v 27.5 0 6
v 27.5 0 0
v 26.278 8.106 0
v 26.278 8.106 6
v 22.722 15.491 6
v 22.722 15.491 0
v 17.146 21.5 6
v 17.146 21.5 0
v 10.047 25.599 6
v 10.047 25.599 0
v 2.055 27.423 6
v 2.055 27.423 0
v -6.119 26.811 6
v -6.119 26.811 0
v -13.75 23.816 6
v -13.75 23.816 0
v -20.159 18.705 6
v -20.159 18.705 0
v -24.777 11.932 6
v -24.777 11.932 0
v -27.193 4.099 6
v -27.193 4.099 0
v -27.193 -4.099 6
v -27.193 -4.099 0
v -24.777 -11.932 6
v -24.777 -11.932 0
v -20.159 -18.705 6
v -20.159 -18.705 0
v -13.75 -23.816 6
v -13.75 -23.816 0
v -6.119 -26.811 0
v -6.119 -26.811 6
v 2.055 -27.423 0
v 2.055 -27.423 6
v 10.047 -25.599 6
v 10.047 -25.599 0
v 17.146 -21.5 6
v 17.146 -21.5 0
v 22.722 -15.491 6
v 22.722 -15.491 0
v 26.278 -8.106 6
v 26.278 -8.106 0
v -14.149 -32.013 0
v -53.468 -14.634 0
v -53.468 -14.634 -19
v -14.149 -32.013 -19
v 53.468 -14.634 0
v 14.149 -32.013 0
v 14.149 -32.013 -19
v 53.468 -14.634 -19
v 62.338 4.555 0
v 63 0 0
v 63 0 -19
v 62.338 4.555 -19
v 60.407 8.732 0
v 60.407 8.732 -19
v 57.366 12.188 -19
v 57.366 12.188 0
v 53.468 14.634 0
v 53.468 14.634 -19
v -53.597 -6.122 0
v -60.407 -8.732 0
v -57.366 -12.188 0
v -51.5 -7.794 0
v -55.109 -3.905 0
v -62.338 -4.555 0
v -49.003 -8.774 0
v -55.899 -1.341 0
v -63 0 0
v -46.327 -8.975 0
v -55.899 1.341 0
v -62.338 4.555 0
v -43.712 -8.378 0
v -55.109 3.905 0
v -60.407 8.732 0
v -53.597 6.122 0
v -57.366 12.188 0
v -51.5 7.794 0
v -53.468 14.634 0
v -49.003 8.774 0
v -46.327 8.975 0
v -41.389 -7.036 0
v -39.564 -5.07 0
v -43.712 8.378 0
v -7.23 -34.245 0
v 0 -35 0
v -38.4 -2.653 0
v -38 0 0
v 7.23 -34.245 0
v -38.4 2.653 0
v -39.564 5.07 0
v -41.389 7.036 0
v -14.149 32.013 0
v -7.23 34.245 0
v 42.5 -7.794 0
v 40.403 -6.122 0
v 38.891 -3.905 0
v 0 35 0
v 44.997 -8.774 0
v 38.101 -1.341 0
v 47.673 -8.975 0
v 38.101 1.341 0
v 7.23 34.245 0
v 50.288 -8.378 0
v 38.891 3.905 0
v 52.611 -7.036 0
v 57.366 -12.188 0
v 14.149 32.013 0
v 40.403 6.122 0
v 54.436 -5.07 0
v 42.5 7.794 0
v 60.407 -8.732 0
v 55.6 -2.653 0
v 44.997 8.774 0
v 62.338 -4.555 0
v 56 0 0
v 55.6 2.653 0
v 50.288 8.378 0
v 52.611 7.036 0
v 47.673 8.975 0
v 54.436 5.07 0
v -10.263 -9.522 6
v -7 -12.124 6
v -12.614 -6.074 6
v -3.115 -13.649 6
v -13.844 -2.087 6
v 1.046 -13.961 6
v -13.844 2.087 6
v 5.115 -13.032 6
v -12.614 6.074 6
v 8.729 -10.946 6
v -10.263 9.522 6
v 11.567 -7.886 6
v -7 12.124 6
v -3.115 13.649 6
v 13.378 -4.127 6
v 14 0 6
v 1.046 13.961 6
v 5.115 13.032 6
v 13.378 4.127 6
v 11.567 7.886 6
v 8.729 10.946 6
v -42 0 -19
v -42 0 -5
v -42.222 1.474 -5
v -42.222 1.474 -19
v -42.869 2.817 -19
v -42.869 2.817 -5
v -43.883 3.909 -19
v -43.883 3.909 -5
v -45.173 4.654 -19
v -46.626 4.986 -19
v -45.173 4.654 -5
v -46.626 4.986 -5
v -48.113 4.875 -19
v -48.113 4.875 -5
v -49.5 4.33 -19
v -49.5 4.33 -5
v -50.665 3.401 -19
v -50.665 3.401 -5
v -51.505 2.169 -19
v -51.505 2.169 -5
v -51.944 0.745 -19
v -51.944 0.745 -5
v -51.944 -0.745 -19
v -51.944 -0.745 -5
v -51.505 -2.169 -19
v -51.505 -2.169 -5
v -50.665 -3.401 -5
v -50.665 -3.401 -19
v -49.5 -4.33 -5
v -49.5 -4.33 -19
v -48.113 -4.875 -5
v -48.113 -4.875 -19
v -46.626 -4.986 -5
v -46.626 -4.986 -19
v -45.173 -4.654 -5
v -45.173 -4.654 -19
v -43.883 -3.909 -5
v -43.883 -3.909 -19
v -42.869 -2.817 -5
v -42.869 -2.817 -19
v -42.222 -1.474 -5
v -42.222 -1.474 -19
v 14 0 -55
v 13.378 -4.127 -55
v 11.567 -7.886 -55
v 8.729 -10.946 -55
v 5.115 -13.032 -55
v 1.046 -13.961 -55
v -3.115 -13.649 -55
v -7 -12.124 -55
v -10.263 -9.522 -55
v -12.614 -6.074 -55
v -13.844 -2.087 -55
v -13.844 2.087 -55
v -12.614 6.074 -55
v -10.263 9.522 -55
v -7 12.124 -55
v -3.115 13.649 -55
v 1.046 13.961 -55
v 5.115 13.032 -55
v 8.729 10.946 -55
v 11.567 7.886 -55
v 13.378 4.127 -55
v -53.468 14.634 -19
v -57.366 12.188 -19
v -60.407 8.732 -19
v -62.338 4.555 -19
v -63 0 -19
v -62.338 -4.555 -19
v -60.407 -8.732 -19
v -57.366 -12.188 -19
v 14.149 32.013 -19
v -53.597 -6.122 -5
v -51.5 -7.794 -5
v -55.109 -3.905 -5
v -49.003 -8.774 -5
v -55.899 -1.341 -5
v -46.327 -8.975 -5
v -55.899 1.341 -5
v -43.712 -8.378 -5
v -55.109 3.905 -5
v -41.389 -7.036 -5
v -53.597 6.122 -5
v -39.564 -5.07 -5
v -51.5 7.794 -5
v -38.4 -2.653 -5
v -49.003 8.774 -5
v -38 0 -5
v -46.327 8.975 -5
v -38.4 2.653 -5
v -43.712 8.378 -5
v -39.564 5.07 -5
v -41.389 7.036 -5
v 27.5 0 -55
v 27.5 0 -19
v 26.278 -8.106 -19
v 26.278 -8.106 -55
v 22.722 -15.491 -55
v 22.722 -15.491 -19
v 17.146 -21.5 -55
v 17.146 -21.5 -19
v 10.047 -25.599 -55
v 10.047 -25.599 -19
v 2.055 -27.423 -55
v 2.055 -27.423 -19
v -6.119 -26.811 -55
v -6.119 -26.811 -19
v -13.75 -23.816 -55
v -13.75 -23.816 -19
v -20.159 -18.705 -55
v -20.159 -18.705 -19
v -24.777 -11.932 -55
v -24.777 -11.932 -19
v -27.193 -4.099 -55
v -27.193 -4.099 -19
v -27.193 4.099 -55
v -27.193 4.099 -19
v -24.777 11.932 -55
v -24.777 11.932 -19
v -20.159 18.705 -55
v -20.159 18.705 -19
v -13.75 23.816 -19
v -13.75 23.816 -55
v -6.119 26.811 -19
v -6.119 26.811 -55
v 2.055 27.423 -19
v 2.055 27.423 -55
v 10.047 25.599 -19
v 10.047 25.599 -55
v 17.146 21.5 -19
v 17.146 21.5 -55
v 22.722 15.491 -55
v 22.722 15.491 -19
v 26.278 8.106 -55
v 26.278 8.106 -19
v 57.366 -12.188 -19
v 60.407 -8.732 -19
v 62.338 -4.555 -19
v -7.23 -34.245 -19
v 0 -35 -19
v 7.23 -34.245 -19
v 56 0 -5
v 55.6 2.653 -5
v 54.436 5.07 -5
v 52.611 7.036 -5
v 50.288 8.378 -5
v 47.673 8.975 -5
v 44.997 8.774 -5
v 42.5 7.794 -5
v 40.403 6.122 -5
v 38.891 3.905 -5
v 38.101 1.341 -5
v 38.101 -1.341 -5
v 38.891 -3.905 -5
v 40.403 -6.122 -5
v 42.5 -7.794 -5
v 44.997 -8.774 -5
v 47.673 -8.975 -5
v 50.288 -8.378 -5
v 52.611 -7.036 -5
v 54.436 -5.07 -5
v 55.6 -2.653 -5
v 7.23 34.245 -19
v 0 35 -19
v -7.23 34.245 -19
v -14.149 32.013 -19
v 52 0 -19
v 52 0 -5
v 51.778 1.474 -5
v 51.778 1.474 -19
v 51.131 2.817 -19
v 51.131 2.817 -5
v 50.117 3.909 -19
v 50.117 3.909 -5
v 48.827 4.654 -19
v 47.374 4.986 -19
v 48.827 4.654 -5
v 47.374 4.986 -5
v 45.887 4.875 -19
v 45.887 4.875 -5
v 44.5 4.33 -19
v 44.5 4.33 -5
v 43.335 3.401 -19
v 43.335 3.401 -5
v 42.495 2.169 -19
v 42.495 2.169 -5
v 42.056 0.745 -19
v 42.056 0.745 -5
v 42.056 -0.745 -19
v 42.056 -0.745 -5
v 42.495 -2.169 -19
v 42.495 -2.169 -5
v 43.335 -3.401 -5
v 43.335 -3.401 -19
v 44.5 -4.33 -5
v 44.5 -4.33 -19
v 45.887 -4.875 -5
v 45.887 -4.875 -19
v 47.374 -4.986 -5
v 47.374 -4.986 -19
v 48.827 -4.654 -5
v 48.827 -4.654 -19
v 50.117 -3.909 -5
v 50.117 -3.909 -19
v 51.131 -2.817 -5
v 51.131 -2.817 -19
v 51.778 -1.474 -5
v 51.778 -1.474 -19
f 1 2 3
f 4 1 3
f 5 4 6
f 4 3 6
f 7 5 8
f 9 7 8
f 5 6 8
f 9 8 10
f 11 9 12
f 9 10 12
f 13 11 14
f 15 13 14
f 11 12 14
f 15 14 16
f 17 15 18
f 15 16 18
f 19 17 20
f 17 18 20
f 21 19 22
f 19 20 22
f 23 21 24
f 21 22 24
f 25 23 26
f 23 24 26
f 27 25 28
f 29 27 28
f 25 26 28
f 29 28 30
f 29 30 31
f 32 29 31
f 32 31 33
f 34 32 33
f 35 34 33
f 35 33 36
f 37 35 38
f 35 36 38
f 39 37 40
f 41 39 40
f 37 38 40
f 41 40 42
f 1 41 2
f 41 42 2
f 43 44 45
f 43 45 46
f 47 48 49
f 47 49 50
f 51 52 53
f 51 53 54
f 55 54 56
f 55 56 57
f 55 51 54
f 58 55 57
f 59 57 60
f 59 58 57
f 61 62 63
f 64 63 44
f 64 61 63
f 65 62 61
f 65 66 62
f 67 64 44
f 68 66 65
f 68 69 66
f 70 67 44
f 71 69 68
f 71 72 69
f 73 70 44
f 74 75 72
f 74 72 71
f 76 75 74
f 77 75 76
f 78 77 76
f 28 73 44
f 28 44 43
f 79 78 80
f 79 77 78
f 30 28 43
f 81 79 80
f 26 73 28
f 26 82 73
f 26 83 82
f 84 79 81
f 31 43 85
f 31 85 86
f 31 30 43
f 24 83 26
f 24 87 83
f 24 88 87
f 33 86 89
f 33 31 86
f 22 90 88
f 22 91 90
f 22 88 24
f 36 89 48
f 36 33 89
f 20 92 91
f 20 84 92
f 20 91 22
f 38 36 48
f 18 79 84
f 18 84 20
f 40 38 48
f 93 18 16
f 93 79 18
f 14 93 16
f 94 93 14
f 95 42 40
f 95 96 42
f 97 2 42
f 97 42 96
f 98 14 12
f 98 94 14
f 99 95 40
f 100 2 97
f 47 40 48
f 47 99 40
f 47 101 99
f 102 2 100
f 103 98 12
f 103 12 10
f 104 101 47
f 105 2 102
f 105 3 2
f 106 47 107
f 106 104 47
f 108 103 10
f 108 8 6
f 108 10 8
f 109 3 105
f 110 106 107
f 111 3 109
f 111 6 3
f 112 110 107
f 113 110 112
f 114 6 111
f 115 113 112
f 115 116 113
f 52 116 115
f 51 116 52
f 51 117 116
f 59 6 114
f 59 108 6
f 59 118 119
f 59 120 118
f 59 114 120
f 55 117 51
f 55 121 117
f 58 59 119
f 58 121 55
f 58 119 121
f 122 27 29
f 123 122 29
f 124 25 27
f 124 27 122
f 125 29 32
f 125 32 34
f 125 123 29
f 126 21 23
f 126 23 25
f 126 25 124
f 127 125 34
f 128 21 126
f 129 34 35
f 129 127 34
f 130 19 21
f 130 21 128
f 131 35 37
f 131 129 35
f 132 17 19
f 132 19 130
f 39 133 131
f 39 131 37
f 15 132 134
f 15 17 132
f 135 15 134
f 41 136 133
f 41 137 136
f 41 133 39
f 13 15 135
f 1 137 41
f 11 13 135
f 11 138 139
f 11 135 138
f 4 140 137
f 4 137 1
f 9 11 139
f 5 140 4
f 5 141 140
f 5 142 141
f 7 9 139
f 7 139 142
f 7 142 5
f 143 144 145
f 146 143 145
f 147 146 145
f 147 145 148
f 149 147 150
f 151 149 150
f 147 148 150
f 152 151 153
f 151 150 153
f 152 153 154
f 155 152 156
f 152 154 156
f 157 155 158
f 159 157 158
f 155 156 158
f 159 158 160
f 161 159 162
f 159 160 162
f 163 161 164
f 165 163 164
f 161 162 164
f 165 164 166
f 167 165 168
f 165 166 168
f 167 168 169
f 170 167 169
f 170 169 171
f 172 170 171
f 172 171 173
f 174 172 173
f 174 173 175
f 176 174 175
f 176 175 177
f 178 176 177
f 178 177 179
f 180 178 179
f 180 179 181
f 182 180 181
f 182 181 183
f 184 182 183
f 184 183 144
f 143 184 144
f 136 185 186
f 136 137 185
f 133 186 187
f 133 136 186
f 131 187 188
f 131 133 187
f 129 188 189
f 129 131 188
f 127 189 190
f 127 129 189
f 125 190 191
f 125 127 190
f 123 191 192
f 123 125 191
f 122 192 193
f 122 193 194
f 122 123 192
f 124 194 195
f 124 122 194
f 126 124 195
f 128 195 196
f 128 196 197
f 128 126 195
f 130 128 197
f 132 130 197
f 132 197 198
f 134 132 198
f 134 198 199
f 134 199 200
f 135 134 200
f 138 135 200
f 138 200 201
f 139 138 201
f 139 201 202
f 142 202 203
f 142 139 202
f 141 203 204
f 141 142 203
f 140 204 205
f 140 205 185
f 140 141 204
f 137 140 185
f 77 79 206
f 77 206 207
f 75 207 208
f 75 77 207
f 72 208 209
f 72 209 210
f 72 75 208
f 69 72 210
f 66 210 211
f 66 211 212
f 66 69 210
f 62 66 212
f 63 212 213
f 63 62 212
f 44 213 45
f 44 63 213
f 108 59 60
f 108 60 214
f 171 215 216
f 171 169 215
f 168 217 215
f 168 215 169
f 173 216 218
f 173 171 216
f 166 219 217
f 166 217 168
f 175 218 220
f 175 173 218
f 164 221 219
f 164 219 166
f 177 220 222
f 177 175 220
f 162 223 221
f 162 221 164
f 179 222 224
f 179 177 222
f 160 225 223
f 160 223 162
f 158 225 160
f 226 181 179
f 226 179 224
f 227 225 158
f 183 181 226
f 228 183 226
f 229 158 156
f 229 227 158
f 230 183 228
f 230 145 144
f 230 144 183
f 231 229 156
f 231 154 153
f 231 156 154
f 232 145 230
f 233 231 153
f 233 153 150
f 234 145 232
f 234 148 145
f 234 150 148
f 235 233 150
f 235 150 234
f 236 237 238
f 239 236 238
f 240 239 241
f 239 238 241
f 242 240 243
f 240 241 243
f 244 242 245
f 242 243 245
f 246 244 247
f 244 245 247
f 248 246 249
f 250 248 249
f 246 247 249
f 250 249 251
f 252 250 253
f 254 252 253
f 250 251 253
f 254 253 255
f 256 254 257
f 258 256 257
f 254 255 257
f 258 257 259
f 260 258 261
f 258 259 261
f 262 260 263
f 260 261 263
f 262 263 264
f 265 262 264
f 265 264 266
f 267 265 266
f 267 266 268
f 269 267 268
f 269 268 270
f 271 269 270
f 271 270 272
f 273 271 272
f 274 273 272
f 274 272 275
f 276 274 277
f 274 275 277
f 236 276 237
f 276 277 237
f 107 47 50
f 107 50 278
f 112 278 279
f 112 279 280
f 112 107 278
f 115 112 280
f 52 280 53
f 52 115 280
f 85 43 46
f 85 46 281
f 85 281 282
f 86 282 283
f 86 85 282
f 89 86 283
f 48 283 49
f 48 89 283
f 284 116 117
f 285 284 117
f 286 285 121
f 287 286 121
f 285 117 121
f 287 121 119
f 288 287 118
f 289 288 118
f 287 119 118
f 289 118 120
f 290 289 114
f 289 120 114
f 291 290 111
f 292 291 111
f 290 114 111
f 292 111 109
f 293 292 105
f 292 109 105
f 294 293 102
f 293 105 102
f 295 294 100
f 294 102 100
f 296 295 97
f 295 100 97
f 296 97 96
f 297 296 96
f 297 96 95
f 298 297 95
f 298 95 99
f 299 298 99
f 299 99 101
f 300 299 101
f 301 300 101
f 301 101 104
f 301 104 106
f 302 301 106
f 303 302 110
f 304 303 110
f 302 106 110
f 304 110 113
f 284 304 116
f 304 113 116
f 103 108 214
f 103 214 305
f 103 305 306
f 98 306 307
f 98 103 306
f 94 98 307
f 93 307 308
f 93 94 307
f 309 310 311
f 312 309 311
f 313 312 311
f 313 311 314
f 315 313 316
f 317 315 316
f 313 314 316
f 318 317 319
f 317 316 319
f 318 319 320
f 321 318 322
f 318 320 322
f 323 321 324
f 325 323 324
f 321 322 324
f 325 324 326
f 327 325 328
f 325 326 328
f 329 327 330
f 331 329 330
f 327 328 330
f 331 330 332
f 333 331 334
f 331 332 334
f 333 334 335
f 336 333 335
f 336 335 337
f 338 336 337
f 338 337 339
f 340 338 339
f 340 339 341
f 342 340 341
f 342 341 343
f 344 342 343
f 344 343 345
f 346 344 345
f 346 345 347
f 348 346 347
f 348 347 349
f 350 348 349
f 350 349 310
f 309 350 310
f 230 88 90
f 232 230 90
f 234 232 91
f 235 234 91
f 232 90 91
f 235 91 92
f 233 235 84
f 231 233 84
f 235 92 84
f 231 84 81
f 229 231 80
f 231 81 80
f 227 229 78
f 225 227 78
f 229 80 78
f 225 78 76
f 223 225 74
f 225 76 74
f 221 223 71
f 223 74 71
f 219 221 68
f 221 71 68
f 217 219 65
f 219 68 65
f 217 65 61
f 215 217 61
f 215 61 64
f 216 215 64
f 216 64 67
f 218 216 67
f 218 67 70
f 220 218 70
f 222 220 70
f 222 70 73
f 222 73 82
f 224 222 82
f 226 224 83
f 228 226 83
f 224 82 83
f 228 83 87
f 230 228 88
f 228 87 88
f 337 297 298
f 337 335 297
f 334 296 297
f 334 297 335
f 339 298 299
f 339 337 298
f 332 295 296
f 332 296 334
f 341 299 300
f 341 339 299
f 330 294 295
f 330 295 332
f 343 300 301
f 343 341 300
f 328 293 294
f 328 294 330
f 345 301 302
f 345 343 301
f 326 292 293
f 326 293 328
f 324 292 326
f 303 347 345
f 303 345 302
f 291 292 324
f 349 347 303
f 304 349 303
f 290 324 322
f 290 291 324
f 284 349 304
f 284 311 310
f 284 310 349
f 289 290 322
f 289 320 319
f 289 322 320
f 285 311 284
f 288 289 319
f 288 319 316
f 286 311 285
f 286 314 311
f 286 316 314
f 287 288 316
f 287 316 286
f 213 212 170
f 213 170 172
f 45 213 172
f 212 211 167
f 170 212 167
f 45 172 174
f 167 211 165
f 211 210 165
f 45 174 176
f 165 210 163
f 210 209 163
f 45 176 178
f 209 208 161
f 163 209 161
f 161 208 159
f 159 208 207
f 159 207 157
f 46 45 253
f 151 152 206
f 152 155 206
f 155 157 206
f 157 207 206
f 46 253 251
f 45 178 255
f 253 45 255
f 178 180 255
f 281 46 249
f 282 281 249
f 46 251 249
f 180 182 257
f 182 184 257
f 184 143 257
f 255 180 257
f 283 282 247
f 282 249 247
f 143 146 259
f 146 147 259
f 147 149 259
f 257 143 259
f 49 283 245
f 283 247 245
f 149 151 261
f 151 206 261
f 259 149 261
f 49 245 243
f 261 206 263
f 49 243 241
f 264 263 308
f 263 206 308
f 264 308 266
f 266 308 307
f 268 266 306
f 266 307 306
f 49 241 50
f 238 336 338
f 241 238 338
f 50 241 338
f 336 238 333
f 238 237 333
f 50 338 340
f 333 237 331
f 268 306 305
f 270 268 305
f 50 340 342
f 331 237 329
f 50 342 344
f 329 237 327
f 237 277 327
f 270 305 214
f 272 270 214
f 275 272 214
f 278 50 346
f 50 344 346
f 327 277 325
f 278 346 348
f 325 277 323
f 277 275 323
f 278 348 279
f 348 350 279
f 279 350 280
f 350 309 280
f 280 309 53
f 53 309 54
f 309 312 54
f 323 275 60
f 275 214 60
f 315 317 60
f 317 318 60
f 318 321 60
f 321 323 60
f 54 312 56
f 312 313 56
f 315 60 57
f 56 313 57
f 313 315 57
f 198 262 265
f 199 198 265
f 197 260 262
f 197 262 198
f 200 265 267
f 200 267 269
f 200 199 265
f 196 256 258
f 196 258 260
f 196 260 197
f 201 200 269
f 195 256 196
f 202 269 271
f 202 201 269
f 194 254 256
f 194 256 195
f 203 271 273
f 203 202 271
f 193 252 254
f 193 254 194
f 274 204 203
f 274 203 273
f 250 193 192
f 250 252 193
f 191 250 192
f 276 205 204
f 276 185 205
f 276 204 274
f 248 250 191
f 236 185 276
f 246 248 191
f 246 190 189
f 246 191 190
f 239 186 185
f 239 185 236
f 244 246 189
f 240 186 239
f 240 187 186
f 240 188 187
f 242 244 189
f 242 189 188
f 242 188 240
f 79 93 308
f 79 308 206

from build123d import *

# Parameters (mm, degrees)
F0_R     = 27.5
F0_R_2   = 14
F1_DEPTH = 19
F2_DEPTH = 6
F3_R     = 27.5
F3_R_2   = 14
F4_DEPTH = 36
F5_R     = 5
F6_DEPTH = 25
F7_R     = 9
F8_DEPTH = 5


with BuildPart() as f1:
    # F0 (on Top) → F1 (new body)
    with BuildSketch(Plane.XY):
        with BuildLine():
            ThreePointArc((-33.8085106383, -9.0545352404), (-35, 0), (-33.8085106383, 9.0545352404))
            ThreePointArc((-33.8085106383, 9.0545352404), (-42.6314083028, 15.3920566067), (-53.4680851064, 14.6343389006))
            ThreePointArc((-53.4680851064, 14.6343389006), (-63, 0), (-53.4680851064, -14.6343389006))
            ThreePointArc((-53.4680851064, -14.6343389006), (-42.6314083028, -15.3920566067), (-33.8085106383, -9.0545352404))
        make_face()
        with BuildLine():
            ThreePointArc((-33.8085106383, 9.0545352404), (-26.5847239613, 22.7651587278), (-14.1489361702, 32.012616345))
            Line((-14.1489361702, 32.012616345), (-53.4680851064, 14.6343389006))
            ThreePointArc((-53.4680851064, 14.6343389006), (-42.6314083028, 15.3920566067), (-33.8085106383, 9.0545352404))
        make_face()
        with BuildLine():
            ThreePointArc((-31, 0), (-31.7182489585, 4.7400511713), (-33.8085106383, 9.0545352404))
            ThreePointArc((-33.8085106383, 9.0545352404), (-35, 0), (-33.8085106383, -9.0545352404))
            ThreePointArc((-33.8085106383, -9.0545352404), (-31.7182489585, -4.7400511713), (-31, 0))
        make_face()
        with BuildLine():
            ThreePointArc((33.8085106383, 9.0545352404), (26.5847239613, 22.7651587278), (14.1489361702, 32.012616345))
            ThreePointArc((14.1489361702, 32.012616345), (0, 35), (-14.1489361702, 32.012616345))
            ThreePointArc((-14.1489361702, 32.012616345), (-26.5847239613, 22.7651587278), (-33.8085106383, 9.0545352404))
            ThreePointArc((-33.8085106383, 9.0545352404), (-31.7182489585, 4.7400511713), (-31, 0))
            ThreePointArc((-31, 0), (-31.7182489585, -4.7400511713), (-33.8085106383, -9.0545352404))
            ThreePointArc((-33.8085106383, -9.0545352404), (-26.5847239613, -22.7651587278), (-14.1489361702, -32.012616345))
            ThreePointArc((-14.1489361702, -32.012616345), (0, -35), (14.1489361702, -32.012616345))
            ThreePointArc((14.1489361702, -32.012616345), (26.5847239613, -22.7651587278), (33.8085106383, -9.0545352404))
            ThreePointArc((33.8085106383, -9.0545352404), (31, 0), (33.8085106383, 9.0545352404))
        make_face()
        Circle(F0_R, mode=Mode.SUBTRACT)
        with BuildLine():
            ThreePointArc((-14.1489361702, -32.012616345), (-26.5847239613, -22.7651587278), (-33.8085106383, -9.0545352404))
            ThreePointArc((-33.8085106383, -9.0545352404), (-42.6314083028, -15.3920566067), (-53.4680851064, -14.6343389006))
            Line((-53.4680851064, -14.6343389006), (-14.1489361702, -32.012616345))
        make_face()
        Circle(F0_R)
        Circle(F0_R_2, mode=Mode.SUBTRACT)
        with BuildLine():
            ThreePointArc((53.4680851064, 14.6343389006), (42.6314083028, 15.3920566067), (33.8085106383, 9.0545352404))
            ThreePointArc((33.8085106383, 9.0545352404), (34.700849214, 4.5662965114), (35, 0))
            ThreePointArc((35, 0), (34.700849214, -4.5662965114), (33.8085106383, -9.0545352404))
            ThreePointArc((33.8085106383, -9.0545352404), (42.6314083028, -15.3920566067), (53.4680851064, -14.6343389006))
            ThreePointArc((53.4680851064, -14.6343389006), (60.4068893055, -8.7324291666), (63, 0))
            ThreePointArc((63, 0), (60.4068893055, 8.7324291666), (53.4680851064, 14.6343389006))
        make_face()
        with BuildLine():
            ThreePointArc((35, 0), (34.700849214, 4.5662965114), (33.8085106383, 9.0545352404))
            ThreePointArc((33.8085106383, 9.0545352404), (31, 0), (33.8085106383, -9.0545352404))
            ThreePointArc((33.8085106383, -9.0545352404), (34.700849214, -4.5662965114), (35, 0))
        make_face()
        with BuildLine():
            Line((53.4680851064, 14.6343389006), (14.1489361702, 32.012616345))
            ThreePointArc((14.1489361702, 32.012616345), (26.5847239613, 22.7651587278), (33.8085106383, 9.0545352404))
            ThreePointArc((33.8085106383, 9.0545352404), (42.6314083028, 15.3920566067), (53.4680851064, 14.6343389006))
        make_face()
        with BuildLine():
            ThreePointArc((53.4680851064, -14.6343389006), (42.6314083028, -15.3920566067), (33.8085106383, -9.0545352404))
            ThreePointArc((33.8085106383, -9.0545352404), (26.5847239613, -22.7651587278), (14.1489361702, -32.012616345))
            Line((14.1489361702, -32.012616345), (53.4680851064, -14.6343389006))
        make_face()
    extrude(amount=-F1_DEPTH)

    # F0 (on Top) → F2 (join)
    with BuildSketch(Plane.XY):
        Circle(F0_R)
        Circle(F0_R_2, mode=Mode.SUBTRACT)
    extrude(amount=F2_DEPTH)

    # F3 (on face) → F4 (join)
    with BuildSketch(Plane(origin=(0, 0, -19), x_dir=(1, 0, 0), z_dir=(0, 0, -1))):
        Circle(F3_R)
        Circle(F3_R_2, mode=Mode.SUBTRACT)
    extrude(amount=F4_DEPTH)

    # F5 (on face) → F6 (cut)
    with BuildSketch(Plane.XY):
        with Locations((-47, 0)):
            Circle(F5_R)
        with Locations((47, 0)):
            Circle(F5_R)
    extrude(amount=-F6_DEPTH, mode=Mode.SUBTRACT)

    # F7 (on face) → F8 (cut)
    with BuildSketch(Plane.XY):
        with Locations((-47, 0)):
            Circle(F7_R)
        with Locations((47, 0)):
            Circle(F7_R)
    extrude(amount=-F8_DEPTH, mode=Mode.SUBTRACT)


solid = f1.part
